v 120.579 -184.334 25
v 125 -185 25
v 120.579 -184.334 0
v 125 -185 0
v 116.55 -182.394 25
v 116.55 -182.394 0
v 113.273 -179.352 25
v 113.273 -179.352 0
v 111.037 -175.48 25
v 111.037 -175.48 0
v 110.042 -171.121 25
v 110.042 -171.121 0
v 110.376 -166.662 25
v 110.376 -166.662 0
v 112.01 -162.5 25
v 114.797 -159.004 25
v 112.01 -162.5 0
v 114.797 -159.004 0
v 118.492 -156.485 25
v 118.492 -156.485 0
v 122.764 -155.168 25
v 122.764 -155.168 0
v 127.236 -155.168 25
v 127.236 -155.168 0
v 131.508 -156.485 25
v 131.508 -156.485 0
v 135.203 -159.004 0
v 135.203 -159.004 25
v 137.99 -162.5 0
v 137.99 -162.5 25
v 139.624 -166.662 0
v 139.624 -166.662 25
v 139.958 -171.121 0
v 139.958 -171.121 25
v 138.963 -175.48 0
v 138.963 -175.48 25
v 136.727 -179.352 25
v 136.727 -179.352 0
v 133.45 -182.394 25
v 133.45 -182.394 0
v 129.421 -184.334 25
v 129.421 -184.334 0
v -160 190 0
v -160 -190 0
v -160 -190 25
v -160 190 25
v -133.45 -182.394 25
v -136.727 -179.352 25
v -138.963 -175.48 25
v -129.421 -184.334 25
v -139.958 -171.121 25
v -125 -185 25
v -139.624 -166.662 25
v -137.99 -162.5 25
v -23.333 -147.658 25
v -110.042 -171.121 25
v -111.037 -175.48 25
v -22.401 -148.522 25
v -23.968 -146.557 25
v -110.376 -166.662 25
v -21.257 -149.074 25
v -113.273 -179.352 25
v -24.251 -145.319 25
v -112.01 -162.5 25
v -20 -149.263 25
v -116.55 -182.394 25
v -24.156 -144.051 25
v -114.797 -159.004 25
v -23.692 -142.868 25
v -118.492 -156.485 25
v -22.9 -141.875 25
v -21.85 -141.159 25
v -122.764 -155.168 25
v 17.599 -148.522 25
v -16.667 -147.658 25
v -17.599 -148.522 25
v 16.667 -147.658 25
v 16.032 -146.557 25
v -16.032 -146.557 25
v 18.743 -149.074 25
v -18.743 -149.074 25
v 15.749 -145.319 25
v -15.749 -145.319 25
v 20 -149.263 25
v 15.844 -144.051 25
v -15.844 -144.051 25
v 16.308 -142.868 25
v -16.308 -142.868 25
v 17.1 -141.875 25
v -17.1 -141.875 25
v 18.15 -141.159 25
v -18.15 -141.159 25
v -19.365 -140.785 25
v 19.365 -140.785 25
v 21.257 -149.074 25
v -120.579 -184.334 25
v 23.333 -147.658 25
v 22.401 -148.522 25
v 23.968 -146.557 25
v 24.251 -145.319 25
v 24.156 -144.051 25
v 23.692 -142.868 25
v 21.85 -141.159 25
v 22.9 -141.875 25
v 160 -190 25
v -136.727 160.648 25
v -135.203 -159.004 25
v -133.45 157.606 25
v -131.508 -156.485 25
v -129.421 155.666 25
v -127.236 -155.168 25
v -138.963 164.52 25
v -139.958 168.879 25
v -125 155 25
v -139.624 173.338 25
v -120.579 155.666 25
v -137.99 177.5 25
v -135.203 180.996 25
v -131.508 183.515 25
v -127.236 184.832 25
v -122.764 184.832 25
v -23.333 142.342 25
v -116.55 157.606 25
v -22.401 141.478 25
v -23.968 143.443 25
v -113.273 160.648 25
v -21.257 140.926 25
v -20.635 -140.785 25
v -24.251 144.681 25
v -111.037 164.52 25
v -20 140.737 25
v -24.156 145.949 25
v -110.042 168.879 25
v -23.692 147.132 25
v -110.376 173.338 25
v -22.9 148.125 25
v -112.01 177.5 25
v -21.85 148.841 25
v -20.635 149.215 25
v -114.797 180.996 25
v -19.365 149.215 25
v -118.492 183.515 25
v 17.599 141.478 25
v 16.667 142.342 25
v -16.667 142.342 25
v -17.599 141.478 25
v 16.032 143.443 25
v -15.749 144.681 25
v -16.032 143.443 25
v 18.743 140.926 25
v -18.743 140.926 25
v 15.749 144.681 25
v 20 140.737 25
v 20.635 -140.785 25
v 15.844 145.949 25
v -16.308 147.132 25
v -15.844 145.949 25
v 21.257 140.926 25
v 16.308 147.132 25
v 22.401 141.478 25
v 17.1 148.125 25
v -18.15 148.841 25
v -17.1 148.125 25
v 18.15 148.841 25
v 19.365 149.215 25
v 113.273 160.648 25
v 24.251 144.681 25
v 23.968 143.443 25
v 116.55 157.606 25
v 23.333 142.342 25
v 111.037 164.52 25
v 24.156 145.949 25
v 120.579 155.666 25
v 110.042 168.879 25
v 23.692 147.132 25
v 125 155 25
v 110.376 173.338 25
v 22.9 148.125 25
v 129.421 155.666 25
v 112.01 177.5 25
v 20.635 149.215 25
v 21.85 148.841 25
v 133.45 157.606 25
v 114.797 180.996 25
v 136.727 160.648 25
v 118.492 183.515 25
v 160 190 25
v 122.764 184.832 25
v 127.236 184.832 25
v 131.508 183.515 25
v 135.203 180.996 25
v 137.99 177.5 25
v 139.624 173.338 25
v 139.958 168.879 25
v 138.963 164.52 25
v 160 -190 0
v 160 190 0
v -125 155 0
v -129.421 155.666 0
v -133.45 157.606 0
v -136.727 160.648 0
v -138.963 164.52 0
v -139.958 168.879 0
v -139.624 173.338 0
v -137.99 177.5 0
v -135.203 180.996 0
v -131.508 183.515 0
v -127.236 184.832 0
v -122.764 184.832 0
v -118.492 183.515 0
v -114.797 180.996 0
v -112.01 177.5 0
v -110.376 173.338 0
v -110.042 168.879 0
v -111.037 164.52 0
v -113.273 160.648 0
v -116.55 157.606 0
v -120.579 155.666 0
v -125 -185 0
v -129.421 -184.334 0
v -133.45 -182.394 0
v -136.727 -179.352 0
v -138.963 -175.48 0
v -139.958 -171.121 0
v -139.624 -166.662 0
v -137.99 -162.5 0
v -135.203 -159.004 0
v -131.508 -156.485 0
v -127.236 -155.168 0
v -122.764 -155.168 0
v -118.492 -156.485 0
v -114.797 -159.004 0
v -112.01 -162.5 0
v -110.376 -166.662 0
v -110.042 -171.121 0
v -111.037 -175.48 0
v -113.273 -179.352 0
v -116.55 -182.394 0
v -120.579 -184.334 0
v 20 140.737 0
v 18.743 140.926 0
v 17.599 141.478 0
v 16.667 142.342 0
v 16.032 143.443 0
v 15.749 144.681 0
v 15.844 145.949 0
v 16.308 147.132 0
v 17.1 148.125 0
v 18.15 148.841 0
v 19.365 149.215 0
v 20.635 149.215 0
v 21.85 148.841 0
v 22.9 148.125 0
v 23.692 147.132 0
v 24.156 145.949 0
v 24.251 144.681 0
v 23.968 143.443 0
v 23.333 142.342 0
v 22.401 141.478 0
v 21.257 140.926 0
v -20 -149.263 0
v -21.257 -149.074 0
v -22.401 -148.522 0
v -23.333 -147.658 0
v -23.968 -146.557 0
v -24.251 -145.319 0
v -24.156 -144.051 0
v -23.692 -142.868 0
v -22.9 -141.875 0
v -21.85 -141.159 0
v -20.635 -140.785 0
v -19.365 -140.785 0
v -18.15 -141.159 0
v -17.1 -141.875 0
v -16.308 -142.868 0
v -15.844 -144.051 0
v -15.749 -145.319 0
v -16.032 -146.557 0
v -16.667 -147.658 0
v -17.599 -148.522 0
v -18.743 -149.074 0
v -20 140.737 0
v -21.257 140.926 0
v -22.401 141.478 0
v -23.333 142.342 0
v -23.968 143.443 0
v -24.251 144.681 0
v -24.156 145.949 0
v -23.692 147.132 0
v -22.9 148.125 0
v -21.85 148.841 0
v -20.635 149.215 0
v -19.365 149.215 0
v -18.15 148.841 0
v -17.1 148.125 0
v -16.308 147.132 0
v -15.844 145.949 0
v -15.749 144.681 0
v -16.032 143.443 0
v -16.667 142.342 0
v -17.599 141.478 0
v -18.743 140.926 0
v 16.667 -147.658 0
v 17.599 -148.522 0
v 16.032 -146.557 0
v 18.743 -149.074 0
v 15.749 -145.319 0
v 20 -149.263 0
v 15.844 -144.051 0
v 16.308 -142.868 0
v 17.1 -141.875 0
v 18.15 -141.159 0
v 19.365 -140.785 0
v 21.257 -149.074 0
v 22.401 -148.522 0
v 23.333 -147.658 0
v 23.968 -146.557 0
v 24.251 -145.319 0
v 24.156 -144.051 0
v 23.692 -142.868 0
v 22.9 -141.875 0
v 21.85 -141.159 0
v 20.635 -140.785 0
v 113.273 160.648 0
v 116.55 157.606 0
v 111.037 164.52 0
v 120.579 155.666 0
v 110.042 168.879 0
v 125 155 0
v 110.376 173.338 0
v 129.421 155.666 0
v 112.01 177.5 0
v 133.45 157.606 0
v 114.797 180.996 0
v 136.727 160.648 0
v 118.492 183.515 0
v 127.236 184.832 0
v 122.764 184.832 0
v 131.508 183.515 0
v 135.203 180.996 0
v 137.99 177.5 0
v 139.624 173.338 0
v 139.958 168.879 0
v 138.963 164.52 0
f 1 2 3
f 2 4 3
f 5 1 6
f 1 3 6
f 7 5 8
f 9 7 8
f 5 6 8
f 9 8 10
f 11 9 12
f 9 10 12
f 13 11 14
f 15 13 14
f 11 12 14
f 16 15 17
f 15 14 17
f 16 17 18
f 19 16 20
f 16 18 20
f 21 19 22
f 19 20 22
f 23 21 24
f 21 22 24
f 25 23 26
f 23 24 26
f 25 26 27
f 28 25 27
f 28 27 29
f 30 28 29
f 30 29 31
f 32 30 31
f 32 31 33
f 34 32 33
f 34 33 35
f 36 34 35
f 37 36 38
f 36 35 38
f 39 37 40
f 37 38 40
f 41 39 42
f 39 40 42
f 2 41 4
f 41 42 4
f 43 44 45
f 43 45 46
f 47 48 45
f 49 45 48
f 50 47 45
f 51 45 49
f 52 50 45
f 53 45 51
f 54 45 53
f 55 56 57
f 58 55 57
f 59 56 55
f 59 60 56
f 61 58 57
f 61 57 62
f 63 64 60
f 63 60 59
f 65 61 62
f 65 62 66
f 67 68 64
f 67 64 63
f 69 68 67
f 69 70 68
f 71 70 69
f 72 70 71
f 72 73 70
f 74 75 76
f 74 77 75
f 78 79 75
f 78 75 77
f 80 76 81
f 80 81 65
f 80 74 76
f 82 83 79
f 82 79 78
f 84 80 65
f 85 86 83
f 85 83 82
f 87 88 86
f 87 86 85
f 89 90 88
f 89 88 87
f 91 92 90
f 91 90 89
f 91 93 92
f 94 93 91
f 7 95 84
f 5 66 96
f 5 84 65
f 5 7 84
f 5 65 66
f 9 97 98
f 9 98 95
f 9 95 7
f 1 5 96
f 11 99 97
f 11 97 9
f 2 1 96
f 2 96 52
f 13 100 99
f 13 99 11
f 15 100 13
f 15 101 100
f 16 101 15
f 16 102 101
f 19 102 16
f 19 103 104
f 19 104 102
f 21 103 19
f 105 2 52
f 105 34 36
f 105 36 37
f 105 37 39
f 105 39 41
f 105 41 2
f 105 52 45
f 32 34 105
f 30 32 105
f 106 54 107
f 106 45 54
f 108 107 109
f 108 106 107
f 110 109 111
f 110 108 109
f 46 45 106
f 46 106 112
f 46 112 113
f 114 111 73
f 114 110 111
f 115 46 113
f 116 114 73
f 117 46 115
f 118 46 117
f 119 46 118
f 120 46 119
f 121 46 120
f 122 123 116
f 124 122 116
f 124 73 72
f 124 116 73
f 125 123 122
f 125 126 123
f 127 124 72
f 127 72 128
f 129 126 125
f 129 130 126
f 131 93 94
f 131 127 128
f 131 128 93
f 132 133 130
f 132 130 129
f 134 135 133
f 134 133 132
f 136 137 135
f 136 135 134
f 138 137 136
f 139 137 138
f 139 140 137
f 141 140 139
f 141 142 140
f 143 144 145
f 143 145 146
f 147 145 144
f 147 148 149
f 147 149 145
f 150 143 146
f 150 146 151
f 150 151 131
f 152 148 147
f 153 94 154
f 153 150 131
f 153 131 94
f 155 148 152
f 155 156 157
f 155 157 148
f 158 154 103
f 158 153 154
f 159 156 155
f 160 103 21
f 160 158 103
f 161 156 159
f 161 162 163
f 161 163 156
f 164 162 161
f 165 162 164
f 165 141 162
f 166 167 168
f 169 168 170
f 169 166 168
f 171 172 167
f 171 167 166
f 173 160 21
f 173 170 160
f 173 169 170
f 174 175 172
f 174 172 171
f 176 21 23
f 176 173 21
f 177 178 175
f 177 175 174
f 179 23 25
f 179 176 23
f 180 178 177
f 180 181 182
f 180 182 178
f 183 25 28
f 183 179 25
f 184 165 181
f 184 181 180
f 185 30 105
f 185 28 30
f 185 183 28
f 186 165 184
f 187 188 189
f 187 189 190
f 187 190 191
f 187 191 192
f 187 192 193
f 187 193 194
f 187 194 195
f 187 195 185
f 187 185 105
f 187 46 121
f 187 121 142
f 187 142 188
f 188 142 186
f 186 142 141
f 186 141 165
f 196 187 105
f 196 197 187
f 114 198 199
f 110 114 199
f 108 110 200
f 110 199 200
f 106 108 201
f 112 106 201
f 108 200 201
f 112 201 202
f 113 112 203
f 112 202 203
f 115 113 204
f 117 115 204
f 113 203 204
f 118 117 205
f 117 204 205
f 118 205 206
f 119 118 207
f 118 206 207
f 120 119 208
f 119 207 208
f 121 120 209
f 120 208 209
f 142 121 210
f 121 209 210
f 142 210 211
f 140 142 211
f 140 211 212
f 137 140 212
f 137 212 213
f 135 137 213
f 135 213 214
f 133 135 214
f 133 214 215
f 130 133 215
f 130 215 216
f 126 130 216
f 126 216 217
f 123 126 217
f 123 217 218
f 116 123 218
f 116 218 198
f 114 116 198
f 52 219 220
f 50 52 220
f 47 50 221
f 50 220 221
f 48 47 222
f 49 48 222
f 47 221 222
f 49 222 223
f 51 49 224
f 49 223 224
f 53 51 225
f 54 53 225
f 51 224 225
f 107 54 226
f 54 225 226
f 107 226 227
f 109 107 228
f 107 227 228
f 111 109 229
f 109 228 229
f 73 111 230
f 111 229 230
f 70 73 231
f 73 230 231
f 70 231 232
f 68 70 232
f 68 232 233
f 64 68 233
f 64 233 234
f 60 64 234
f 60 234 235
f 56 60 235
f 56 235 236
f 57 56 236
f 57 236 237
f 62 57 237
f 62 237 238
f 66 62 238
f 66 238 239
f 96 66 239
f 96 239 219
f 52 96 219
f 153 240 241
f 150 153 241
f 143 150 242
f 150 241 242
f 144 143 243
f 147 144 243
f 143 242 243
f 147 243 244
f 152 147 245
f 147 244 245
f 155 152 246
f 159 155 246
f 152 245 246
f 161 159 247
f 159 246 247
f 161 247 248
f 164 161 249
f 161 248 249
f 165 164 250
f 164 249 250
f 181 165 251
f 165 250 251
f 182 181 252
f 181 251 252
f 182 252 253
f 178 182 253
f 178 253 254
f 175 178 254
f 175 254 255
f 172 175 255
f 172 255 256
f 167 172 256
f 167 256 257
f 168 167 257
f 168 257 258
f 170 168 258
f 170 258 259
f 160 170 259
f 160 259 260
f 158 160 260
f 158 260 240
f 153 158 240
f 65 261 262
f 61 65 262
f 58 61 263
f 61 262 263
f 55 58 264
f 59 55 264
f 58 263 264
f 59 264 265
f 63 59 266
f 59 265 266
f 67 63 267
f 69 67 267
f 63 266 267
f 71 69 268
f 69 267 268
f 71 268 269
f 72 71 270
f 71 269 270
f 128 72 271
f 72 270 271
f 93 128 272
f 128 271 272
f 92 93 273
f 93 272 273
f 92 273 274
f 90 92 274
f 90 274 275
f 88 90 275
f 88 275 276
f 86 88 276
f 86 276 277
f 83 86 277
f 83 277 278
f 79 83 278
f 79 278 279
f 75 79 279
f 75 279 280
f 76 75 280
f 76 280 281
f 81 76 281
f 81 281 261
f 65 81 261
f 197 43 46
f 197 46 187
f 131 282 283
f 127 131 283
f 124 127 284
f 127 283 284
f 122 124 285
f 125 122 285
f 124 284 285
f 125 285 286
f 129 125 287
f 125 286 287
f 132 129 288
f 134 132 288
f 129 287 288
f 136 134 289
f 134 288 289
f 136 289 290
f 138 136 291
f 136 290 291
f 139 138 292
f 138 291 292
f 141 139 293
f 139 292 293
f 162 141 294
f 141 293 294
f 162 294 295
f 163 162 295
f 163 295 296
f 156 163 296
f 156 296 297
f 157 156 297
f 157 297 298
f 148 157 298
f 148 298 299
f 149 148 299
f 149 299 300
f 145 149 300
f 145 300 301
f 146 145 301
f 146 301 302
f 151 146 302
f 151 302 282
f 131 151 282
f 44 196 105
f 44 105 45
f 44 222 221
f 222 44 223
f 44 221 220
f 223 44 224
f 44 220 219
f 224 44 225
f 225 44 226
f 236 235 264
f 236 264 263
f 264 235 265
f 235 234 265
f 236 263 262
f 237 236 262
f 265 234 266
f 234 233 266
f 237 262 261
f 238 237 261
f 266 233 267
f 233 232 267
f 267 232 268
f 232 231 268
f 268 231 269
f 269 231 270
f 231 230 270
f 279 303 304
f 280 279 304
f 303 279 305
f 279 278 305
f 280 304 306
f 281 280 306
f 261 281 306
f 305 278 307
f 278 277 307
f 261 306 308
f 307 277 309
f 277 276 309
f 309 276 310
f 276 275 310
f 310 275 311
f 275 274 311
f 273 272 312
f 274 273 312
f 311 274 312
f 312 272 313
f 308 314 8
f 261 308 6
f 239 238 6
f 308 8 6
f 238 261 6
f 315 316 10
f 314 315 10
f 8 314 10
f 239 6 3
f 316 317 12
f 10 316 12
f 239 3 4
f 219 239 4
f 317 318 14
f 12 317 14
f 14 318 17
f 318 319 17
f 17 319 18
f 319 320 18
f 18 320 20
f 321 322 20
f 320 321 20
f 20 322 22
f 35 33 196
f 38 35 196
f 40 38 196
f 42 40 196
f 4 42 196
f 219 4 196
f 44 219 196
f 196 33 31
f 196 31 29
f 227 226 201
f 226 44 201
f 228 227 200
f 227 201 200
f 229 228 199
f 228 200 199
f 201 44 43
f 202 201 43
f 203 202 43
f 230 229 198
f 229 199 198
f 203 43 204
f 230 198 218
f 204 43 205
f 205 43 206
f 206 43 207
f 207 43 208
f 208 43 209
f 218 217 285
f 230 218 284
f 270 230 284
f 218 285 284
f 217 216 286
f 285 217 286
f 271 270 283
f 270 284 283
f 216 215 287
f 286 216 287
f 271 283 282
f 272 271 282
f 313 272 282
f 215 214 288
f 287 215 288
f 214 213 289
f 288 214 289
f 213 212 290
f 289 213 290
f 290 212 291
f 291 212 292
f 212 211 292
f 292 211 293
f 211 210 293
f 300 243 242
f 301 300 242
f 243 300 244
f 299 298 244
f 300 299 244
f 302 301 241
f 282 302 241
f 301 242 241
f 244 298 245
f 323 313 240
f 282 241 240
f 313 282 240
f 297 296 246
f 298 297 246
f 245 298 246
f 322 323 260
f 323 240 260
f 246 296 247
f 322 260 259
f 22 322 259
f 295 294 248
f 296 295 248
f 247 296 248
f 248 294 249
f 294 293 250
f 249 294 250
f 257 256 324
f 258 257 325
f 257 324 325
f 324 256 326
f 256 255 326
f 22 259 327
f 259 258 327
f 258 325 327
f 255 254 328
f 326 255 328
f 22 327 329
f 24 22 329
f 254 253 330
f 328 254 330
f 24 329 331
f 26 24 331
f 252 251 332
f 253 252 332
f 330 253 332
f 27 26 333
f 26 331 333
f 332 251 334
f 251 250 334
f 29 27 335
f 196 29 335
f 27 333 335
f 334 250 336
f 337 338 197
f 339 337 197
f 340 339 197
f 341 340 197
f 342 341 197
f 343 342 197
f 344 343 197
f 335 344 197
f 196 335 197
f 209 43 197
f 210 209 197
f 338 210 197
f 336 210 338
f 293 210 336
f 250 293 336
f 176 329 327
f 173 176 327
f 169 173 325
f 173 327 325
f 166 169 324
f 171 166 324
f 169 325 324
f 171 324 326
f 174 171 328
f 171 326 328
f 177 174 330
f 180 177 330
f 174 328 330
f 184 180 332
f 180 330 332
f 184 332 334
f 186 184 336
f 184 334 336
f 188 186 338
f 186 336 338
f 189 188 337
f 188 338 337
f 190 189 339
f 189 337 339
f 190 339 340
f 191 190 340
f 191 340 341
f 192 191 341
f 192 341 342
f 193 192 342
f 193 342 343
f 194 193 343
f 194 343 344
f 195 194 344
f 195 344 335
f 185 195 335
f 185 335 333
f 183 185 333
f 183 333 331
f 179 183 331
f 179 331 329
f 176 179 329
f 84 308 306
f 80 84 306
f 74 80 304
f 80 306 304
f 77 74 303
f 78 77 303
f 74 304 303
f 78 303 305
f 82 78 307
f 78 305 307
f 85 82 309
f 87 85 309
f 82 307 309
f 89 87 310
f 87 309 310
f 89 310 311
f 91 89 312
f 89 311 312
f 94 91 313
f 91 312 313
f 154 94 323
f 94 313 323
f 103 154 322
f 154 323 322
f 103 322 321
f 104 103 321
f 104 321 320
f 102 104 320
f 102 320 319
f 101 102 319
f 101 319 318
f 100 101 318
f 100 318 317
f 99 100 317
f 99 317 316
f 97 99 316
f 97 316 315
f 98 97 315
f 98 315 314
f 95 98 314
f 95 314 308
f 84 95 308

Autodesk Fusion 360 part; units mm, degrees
sketch "Sketch1" plane through (0, 0, 0) normal (0, 0, 1) x (1, 0, 0)
  line L0 (160, -190) -> (-160, -190)
  line L1 (-160, -190) -> (-160, 190)
  line L2 (-160, 190) -> (160, 190)
  line L3 (160, 190) -> (160, -190)
  line L4 (160, -190) -> (-160, 190) construction
  line L5 (-160, -190) -> (160, 190) construction
  dimension "d1" = 320
  dimension "d2" = 380
extrude "Extrude1" add sketch "Sketch1" along normal blind 25
sketch "Sketch2" plane through (0, 0, 25) normal (0, 0, 1) x (1, 0, 0)
  line L0 (160, 190) -> (-160, 190)
  line L1 (-160, 190) -> (-160, -190)
  line L2 (-160, -190) -> (160, -190)
  line L3 (160, -190) -> (160, 190)
  line L4 (-160, 190) -> (-125, 190)
  line L5 (-125, 190) -> (-125, 170)
  line L6 (-125, 170) -> (-160, 170)
  line L7 (-160, 170) -> (-160, 190)
  line L8 (160, 190) -> (125, 190)
  line L9 (125, 190) -> (125, 170)
  line L10 (125, 170) -> (160, 170)
  line L11 (160, 170) -> (160, 190)
  line L12 (160, -190) -> (125, -190)
  line L13 (125, -190) -> (125, -170)
  line L14 (125, -170) -> (160, -170)
  line L15 (160, -170) -> (160, -190)
  line L16 (-160, -190) -> (-125, -190)
  line L17 (-125, -190) -> (-125, -170)
  line L18 (-125, -170) -> (-160, -170)
  line L19 (-160, -170) -> (-160, -190)
  dimension "d5" = 35
  dimension "d6" = 20
  dimension "d7" = 35
  dimension "d8" = 20
  dimension "d9" = 35
  dimension "d10" = 20
  dimension "d11" = 35
  dimension "d12" = 20
hole "Hole1" at (-125, 170, 25) at (125, 170, 25) at (125, -170, 25) at (-125, -170, 25) direction (0, 0, -1) diameter 30 depth 25 tip angle 118
sketch "Sketch3" plane through (0, 0, 25) normal (0, 0, 1) x (1, 0, 0)
  circle A0 centre (125, -170) radius 15
  circle A1 centre (-125, 170) radius 15
  circle A2 centre (125, 170) radius 15
  circle A3 centre (-125, -170) radius 15
  line L0 (160, 190) -> (-160, 190)
  line L1 (-160, 190) -> (-160, -190)
  line L2 (-160, -190) -> (160, -190)
  line L3 (160, -190) -> (160, 190)
  line L4 (50, -170) -> (-50, -170)
  line L5 (-50, -170) -> (-50, 170)
  line L6 (-50, 170) -> (50, 170)
  line L7 (50, 170) -> (50, -170)
  line L8 (50, -170) -> (-50, 170) construction
  line L9 (-50, -170) -> (50, 170) construction
  line L10 (-50, 170) -> (50, 170)
  line L11 (50, 170) -> (50, 120)
  line L12 (50, 120) -> (-50, 120)
  line L13 (-50, 120) -> (-50, 170)
  line L14 (-50, -170) -> (50, -170)
  line L15 (50, -170) -> (50, -120)
  line L16 (50, -120) -> (-50, -120)
  line L17 (-50, -120) -> (-50, -170)
  line L18 (-50, 170) -> (-20, 170)
  line L19 (-20, 170) -> (-20, 145)
  line L20 (-20, 145) -> (-50, 145)
  line L21 (-50, 145) -> (-50, 170)
  line L22 (50, 170) -> (20, 170)
  line L23 (20, 170) -> (20, 145)
  line L24 (20, 145) -> (50, 145)
  line L25 (50, 145) -> (50, 170)
  line L26 (-50, -170) -> (-20, -170)
  line L27 (-20, -170) -> (-20, -145)
  line L28 (-20, -145) -> (-50, -145)
  line L29 (-50, -145) -> (-50, -170)
  line L30 (50, -170) -> (20, -170)
  line L31 (20, -170) -> (20, -145)
  line L32 (20, -145) -> (50, -145)
  line L33 (50, -145) -> (50, -170)
  dimension "d16" = 100
  dimension "d17" = 340
  dimension "d18" = 100
  dimension "d19" = 50
  dimension "d20" = 50
  dimension "d21" = 30
  dimension "d22" = 25
  dimension "d23" = 25
  dimension "d24" = 30
  dimension "d25" = 30
  dimension "d26" = 25
  dimension "d27" = 25
  dimension "d28" = 30
hole "Hole2" at (-20, 145, 25) at (20, 145, 25) at (-20, -145, 25) at (20, -145, 25) direction (0, 0, -1) diameter 8.526 depth 25 tip angle 118
